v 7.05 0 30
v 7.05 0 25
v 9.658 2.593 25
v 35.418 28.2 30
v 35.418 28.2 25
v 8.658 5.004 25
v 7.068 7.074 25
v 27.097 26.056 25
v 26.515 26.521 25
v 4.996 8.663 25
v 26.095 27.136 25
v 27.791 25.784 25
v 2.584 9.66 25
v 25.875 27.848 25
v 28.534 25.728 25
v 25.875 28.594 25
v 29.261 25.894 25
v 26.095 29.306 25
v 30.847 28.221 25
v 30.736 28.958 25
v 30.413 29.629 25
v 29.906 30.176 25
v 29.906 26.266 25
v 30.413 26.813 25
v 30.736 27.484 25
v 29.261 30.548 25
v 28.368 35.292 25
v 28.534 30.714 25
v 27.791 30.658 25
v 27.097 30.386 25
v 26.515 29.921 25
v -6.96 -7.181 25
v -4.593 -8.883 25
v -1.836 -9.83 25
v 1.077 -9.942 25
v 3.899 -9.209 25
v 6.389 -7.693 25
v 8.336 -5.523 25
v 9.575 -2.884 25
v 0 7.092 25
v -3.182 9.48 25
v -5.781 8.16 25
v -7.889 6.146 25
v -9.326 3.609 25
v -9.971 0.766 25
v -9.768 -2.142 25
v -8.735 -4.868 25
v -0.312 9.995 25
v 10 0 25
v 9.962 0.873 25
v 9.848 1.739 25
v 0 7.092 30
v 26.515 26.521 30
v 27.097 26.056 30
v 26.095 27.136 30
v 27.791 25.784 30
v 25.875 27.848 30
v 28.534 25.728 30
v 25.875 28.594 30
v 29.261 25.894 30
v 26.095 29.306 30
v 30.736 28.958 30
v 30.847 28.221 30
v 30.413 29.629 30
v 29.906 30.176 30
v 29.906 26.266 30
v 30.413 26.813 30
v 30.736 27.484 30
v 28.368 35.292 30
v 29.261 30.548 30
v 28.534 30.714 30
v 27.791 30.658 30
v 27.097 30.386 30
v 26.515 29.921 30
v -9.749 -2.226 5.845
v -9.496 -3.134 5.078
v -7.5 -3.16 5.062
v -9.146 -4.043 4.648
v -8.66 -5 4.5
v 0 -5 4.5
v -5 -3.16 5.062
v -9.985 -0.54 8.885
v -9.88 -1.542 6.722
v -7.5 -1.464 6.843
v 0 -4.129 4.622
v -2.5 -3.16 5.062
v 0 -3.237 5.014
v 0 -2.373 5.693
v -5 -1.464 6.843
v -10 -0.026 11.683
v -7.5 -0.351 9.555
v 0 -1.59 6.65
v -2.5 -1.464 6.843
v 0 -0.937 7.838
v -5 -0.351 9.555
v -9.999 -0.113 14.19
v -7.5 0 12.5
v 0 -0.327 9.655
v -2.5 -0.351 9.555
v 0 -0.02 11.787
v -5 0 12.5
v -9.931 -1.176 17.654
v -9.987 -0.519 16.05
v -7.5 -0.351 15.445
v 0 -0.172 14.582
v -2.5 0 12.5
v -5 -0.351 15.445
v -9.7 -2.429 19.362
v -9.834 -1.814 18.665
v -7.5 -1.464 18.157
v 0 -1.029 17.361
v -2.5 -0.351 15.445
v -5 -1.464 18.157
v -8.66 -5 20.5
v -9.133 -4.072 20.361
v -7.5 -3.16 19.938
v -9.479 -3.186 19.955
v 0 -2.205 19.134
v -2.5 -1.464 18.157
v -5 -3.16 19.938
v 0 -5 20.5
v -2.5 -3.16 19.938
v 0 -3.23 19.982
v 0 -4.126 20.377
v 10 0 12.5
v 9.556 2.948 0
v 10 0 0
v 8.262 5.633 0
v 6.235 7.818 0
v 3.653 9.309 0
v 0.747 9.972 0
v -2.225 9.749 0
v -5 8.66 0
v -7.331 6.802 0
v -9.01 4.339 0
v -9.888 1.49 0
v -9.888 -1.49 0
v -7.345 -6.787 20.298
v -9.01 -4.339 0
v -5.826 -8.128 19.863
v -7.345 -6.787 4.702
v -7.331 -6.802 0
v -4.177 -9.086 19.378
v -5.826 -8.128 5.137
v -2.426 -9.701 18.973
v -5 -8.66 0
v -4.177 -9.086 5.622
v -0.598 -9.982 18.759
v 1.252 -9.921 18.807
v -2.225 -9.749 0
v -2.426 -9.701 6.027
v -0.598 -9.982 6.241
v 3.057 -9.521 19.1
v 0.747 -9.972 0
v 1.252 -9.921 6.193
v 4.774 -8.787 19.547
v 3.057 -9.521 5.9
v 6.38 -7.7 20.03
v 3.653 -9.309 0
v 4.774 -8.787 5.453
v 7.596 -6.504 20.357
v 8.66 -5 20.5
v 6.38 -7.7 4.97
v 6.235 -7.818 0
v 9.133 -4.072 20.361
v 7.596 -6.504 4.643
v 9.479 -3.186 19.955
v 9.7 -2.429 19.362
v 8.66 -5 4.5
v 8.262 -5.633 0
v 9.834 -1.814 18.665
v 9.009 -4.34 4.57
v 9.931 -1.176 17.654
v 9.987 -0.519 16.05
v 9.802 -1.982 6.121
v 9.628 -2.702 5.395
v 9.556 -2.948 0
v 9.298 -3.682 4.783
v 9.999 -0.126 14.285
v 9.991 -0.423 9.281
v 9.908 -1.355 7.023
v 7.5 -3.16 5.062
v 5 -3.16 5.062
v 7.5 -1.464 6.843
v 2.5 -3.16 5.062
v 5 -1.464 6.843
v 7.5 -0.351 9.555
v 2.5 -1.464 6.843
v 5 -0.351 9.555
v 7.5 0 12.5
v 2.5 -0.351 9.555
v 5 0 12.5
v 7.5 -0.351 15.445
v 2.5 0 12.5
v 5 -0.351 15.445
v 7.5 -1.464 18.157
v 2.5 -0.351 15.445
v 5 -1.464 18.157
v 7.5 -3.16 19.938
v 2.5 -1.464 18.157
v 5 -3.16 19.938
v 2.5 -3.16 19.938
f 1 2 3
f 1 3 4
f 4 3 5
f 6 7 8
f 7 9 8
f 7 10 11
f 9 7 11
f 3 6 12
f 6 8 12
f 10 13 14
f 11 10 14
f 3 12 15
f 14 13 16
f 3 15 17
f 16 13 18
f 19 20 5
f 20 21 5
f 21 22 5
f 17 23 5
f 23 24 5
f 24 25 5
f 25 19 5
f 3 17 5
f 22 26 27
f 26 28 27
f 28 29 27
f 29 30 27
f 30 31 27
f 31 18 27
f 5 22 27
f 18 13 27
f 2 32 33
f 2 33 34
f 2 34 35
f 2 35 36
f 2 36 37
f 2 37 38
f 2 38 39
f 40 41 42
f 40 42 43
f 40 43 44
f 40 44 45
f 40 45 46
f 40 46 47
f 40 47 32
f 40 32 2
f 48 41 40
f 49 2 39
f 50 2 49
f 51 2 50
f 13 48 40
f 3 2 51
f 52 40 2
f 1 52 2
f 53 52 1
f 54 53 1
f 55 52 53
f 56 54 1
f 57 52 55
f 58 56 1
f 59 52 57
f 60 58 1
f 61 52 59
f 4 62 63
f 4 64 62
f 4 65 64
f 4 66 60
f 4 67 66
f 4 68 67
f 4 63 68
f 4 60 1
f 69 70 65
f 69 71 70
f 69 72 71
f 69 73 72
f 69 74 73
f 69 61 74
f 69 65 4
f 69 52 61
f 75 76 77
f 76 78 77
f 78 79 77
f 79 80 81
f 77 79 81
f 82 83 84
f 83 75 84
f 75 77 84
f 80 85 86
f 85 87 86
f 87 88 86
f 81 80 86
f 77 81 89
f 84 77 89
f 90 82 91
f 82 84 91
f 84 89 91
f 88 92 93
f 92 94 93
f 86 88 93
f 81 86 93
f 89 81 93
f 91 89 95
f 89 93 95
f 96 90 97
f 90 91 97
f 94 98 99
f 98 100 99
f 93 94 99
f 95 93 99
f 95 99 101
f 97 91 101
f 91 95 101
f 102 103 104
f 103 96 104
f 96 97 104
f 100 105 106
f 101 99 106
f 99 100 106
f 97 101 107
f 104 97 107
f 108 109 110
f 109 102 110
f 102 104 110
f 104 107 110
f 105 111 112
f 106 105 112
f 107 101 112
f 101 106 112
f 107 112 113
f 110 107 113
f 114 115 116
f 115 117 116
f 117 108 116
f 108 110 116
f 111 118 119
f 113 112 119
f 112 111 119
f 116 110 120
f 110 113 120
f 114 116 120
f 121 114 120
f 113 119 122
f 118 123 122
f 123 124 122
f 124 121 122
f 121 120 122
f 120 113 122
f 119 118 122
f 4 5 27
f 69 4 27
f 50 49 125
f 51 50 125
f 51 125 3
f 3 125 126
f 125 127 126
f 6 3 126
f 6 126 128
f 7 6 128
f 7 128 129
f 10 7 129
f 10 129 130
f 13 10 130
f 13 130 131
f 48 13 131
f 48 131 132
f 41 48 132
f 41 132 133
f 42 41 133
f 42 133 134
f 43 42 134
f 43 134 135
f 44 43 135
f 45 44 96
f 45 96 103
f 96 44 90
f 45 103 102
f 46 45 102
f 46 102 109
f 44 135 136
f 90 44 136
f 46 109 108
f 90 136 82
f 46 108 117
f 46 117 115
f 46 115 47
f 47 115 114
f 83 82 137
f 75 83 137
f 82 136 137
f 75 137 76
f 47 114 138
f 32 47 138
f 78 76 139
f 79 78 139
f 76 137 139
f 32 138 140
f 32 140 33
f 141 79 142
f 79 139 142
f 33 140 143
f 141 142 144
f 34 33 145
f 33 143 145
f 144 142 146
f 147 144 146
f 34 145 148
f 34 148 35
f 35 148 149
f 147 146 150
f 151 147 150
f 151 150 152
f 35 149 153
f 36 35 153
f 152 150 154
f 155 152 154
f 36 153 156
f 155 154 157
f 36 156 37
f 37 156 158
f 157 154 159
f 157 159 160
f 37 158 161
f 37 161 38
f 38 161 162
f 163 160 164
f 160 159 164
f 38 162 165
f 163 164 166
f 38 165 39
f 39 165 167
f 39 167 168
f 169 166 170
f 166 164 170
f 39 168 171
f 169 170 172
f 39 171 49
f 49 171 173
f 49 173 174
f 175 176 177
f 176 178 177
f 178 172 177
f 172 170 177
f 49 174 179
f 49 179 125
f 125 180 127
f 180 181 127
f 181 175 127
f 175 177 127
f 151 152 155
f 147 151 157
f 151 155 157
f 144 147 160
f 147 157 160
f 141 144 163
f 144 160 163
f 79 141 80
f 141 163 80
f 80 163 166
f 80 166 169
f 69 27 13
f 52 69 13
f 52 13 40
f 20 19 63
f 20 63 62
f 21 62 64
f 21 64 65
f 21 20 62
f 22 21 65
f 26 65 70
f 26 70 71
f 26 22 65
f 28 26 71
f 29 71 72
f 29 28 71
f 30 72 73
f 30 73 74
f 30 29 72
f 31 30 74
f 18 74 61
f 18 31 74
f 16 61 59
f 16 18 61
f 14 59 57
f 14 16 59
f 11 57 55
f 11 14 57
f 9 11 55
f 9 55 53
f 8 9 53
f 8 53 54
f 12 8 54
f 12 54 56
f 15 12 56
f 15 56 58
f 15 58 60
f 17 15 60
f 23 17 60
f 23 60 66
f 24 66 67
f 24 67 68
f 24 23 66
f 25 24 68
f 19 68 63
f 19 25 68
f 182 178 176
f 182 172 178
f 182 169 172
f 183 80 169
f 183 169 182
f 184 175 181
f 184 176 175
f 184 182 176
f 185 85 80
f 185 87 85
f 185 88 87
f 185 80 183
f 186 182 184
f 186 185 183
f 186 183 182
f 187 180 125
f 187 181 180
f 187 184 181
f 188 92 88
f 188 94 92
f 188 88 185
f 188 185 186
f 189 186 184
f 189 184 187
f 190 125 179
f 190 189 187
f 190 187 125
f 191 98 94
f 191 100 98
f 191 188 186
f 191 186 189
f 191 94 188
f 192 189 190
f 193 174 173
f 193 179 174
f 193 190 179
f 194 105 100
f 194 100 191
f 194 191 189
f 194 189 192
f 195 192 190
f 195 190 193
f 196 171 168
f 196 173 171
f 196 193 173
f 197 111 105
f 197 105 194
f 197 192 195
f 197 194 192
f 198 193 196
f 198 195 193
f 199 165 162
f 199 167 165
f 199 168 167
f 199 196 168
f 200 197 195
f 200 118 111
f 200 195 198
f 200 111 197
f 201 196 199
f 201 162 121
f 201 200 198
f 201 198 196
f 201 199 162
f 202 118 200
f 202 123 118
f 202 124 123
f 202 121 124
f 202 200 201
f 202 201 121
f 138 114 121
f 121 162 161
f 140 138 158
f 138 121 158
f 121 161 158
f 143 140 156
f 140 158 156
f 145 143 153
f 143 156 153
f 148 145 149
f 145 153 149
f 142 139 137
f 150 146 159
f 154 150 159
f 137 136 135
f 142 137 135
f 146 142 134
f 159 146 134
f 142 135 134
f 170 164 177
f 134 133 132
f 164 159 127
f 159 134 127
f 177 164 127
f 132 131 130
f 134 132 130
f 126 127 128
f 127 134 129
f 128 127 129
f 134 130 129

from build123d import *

# Parameters (mm, degrees)
F0_R     = 10
F1_DEPTH = 25
F3_DEPTH = 12.5
F4_R     = 2.5
F5_DEPTH = 5


with BuildPart() as f1:
    # F0 (on Top) → F1 (new body)
    with BuildSketch(Plane.XY):
        Circle(F0_R)
    extrude(amount=F1_DEPTH)

    # F2 (on Right) → F3 (cut, symmetric)
    with BuildSketch(Plane.YZ):
        with BuildLine():
            add(Edge.make_bspline(
                [(-5, 4.5), (0, 4.5), (0, 12.5), (0, 20.5), (-5, 20.5)],
                knots=[3.141593, 3.141593, 3.141593, 4.712389, 4.712389, 6.283185, 6.283185, 6.283185], degree=2, weights=[1, 0.707107, 1, 0.707107, 1]))
            add(Edge.make_bspline(
                [(-5, 20.5), (-10, 20.5), (-10, 12.5), (-10, 4.5), (-5, 4.5)],
                knots=[0, 0, 0, 1.570796, 1.570796, 3.141593, 3.141593, 3.141593], degree=2, weights=[1, 0.707107, 1, 0.707107, 1]))
        make_face()
        with BuildLine():
            add(Edge.make_bspline(
                [(-5, 20.5), (-10, 20.5), (-10, 12.5), (-10, 4.5), (-5, 4.5)],
                knots=[0, 0, 0, 1.570796, 1.570796, 3.141593, 3.141593, 3.141593], degree=2, weights=[1, 0.707107, 1, 0.707107, 1]))
            ThreePointArc((-5, 20.5), (-13, 12.5), (-5, 4.5))
        make_face()
    extrude(amount=F3_DEPTH, both=True, mode=Mode.SUBTRACT)

    # F4 (on face) → F5 (join)
    with BuildSketch(Plane.XY.offset(25)):
        Polygon((28.368292, 35.292073), (0, 7.092073), (7.05, 0), (35.418292, 28.2), align=None)
        with Locations((28.347256, 28.221037)):
            Circle(F4_R, mode=Mode.SUBTRACT)
    extrude(amount=F5_DEPTH)


solid = f1.part
